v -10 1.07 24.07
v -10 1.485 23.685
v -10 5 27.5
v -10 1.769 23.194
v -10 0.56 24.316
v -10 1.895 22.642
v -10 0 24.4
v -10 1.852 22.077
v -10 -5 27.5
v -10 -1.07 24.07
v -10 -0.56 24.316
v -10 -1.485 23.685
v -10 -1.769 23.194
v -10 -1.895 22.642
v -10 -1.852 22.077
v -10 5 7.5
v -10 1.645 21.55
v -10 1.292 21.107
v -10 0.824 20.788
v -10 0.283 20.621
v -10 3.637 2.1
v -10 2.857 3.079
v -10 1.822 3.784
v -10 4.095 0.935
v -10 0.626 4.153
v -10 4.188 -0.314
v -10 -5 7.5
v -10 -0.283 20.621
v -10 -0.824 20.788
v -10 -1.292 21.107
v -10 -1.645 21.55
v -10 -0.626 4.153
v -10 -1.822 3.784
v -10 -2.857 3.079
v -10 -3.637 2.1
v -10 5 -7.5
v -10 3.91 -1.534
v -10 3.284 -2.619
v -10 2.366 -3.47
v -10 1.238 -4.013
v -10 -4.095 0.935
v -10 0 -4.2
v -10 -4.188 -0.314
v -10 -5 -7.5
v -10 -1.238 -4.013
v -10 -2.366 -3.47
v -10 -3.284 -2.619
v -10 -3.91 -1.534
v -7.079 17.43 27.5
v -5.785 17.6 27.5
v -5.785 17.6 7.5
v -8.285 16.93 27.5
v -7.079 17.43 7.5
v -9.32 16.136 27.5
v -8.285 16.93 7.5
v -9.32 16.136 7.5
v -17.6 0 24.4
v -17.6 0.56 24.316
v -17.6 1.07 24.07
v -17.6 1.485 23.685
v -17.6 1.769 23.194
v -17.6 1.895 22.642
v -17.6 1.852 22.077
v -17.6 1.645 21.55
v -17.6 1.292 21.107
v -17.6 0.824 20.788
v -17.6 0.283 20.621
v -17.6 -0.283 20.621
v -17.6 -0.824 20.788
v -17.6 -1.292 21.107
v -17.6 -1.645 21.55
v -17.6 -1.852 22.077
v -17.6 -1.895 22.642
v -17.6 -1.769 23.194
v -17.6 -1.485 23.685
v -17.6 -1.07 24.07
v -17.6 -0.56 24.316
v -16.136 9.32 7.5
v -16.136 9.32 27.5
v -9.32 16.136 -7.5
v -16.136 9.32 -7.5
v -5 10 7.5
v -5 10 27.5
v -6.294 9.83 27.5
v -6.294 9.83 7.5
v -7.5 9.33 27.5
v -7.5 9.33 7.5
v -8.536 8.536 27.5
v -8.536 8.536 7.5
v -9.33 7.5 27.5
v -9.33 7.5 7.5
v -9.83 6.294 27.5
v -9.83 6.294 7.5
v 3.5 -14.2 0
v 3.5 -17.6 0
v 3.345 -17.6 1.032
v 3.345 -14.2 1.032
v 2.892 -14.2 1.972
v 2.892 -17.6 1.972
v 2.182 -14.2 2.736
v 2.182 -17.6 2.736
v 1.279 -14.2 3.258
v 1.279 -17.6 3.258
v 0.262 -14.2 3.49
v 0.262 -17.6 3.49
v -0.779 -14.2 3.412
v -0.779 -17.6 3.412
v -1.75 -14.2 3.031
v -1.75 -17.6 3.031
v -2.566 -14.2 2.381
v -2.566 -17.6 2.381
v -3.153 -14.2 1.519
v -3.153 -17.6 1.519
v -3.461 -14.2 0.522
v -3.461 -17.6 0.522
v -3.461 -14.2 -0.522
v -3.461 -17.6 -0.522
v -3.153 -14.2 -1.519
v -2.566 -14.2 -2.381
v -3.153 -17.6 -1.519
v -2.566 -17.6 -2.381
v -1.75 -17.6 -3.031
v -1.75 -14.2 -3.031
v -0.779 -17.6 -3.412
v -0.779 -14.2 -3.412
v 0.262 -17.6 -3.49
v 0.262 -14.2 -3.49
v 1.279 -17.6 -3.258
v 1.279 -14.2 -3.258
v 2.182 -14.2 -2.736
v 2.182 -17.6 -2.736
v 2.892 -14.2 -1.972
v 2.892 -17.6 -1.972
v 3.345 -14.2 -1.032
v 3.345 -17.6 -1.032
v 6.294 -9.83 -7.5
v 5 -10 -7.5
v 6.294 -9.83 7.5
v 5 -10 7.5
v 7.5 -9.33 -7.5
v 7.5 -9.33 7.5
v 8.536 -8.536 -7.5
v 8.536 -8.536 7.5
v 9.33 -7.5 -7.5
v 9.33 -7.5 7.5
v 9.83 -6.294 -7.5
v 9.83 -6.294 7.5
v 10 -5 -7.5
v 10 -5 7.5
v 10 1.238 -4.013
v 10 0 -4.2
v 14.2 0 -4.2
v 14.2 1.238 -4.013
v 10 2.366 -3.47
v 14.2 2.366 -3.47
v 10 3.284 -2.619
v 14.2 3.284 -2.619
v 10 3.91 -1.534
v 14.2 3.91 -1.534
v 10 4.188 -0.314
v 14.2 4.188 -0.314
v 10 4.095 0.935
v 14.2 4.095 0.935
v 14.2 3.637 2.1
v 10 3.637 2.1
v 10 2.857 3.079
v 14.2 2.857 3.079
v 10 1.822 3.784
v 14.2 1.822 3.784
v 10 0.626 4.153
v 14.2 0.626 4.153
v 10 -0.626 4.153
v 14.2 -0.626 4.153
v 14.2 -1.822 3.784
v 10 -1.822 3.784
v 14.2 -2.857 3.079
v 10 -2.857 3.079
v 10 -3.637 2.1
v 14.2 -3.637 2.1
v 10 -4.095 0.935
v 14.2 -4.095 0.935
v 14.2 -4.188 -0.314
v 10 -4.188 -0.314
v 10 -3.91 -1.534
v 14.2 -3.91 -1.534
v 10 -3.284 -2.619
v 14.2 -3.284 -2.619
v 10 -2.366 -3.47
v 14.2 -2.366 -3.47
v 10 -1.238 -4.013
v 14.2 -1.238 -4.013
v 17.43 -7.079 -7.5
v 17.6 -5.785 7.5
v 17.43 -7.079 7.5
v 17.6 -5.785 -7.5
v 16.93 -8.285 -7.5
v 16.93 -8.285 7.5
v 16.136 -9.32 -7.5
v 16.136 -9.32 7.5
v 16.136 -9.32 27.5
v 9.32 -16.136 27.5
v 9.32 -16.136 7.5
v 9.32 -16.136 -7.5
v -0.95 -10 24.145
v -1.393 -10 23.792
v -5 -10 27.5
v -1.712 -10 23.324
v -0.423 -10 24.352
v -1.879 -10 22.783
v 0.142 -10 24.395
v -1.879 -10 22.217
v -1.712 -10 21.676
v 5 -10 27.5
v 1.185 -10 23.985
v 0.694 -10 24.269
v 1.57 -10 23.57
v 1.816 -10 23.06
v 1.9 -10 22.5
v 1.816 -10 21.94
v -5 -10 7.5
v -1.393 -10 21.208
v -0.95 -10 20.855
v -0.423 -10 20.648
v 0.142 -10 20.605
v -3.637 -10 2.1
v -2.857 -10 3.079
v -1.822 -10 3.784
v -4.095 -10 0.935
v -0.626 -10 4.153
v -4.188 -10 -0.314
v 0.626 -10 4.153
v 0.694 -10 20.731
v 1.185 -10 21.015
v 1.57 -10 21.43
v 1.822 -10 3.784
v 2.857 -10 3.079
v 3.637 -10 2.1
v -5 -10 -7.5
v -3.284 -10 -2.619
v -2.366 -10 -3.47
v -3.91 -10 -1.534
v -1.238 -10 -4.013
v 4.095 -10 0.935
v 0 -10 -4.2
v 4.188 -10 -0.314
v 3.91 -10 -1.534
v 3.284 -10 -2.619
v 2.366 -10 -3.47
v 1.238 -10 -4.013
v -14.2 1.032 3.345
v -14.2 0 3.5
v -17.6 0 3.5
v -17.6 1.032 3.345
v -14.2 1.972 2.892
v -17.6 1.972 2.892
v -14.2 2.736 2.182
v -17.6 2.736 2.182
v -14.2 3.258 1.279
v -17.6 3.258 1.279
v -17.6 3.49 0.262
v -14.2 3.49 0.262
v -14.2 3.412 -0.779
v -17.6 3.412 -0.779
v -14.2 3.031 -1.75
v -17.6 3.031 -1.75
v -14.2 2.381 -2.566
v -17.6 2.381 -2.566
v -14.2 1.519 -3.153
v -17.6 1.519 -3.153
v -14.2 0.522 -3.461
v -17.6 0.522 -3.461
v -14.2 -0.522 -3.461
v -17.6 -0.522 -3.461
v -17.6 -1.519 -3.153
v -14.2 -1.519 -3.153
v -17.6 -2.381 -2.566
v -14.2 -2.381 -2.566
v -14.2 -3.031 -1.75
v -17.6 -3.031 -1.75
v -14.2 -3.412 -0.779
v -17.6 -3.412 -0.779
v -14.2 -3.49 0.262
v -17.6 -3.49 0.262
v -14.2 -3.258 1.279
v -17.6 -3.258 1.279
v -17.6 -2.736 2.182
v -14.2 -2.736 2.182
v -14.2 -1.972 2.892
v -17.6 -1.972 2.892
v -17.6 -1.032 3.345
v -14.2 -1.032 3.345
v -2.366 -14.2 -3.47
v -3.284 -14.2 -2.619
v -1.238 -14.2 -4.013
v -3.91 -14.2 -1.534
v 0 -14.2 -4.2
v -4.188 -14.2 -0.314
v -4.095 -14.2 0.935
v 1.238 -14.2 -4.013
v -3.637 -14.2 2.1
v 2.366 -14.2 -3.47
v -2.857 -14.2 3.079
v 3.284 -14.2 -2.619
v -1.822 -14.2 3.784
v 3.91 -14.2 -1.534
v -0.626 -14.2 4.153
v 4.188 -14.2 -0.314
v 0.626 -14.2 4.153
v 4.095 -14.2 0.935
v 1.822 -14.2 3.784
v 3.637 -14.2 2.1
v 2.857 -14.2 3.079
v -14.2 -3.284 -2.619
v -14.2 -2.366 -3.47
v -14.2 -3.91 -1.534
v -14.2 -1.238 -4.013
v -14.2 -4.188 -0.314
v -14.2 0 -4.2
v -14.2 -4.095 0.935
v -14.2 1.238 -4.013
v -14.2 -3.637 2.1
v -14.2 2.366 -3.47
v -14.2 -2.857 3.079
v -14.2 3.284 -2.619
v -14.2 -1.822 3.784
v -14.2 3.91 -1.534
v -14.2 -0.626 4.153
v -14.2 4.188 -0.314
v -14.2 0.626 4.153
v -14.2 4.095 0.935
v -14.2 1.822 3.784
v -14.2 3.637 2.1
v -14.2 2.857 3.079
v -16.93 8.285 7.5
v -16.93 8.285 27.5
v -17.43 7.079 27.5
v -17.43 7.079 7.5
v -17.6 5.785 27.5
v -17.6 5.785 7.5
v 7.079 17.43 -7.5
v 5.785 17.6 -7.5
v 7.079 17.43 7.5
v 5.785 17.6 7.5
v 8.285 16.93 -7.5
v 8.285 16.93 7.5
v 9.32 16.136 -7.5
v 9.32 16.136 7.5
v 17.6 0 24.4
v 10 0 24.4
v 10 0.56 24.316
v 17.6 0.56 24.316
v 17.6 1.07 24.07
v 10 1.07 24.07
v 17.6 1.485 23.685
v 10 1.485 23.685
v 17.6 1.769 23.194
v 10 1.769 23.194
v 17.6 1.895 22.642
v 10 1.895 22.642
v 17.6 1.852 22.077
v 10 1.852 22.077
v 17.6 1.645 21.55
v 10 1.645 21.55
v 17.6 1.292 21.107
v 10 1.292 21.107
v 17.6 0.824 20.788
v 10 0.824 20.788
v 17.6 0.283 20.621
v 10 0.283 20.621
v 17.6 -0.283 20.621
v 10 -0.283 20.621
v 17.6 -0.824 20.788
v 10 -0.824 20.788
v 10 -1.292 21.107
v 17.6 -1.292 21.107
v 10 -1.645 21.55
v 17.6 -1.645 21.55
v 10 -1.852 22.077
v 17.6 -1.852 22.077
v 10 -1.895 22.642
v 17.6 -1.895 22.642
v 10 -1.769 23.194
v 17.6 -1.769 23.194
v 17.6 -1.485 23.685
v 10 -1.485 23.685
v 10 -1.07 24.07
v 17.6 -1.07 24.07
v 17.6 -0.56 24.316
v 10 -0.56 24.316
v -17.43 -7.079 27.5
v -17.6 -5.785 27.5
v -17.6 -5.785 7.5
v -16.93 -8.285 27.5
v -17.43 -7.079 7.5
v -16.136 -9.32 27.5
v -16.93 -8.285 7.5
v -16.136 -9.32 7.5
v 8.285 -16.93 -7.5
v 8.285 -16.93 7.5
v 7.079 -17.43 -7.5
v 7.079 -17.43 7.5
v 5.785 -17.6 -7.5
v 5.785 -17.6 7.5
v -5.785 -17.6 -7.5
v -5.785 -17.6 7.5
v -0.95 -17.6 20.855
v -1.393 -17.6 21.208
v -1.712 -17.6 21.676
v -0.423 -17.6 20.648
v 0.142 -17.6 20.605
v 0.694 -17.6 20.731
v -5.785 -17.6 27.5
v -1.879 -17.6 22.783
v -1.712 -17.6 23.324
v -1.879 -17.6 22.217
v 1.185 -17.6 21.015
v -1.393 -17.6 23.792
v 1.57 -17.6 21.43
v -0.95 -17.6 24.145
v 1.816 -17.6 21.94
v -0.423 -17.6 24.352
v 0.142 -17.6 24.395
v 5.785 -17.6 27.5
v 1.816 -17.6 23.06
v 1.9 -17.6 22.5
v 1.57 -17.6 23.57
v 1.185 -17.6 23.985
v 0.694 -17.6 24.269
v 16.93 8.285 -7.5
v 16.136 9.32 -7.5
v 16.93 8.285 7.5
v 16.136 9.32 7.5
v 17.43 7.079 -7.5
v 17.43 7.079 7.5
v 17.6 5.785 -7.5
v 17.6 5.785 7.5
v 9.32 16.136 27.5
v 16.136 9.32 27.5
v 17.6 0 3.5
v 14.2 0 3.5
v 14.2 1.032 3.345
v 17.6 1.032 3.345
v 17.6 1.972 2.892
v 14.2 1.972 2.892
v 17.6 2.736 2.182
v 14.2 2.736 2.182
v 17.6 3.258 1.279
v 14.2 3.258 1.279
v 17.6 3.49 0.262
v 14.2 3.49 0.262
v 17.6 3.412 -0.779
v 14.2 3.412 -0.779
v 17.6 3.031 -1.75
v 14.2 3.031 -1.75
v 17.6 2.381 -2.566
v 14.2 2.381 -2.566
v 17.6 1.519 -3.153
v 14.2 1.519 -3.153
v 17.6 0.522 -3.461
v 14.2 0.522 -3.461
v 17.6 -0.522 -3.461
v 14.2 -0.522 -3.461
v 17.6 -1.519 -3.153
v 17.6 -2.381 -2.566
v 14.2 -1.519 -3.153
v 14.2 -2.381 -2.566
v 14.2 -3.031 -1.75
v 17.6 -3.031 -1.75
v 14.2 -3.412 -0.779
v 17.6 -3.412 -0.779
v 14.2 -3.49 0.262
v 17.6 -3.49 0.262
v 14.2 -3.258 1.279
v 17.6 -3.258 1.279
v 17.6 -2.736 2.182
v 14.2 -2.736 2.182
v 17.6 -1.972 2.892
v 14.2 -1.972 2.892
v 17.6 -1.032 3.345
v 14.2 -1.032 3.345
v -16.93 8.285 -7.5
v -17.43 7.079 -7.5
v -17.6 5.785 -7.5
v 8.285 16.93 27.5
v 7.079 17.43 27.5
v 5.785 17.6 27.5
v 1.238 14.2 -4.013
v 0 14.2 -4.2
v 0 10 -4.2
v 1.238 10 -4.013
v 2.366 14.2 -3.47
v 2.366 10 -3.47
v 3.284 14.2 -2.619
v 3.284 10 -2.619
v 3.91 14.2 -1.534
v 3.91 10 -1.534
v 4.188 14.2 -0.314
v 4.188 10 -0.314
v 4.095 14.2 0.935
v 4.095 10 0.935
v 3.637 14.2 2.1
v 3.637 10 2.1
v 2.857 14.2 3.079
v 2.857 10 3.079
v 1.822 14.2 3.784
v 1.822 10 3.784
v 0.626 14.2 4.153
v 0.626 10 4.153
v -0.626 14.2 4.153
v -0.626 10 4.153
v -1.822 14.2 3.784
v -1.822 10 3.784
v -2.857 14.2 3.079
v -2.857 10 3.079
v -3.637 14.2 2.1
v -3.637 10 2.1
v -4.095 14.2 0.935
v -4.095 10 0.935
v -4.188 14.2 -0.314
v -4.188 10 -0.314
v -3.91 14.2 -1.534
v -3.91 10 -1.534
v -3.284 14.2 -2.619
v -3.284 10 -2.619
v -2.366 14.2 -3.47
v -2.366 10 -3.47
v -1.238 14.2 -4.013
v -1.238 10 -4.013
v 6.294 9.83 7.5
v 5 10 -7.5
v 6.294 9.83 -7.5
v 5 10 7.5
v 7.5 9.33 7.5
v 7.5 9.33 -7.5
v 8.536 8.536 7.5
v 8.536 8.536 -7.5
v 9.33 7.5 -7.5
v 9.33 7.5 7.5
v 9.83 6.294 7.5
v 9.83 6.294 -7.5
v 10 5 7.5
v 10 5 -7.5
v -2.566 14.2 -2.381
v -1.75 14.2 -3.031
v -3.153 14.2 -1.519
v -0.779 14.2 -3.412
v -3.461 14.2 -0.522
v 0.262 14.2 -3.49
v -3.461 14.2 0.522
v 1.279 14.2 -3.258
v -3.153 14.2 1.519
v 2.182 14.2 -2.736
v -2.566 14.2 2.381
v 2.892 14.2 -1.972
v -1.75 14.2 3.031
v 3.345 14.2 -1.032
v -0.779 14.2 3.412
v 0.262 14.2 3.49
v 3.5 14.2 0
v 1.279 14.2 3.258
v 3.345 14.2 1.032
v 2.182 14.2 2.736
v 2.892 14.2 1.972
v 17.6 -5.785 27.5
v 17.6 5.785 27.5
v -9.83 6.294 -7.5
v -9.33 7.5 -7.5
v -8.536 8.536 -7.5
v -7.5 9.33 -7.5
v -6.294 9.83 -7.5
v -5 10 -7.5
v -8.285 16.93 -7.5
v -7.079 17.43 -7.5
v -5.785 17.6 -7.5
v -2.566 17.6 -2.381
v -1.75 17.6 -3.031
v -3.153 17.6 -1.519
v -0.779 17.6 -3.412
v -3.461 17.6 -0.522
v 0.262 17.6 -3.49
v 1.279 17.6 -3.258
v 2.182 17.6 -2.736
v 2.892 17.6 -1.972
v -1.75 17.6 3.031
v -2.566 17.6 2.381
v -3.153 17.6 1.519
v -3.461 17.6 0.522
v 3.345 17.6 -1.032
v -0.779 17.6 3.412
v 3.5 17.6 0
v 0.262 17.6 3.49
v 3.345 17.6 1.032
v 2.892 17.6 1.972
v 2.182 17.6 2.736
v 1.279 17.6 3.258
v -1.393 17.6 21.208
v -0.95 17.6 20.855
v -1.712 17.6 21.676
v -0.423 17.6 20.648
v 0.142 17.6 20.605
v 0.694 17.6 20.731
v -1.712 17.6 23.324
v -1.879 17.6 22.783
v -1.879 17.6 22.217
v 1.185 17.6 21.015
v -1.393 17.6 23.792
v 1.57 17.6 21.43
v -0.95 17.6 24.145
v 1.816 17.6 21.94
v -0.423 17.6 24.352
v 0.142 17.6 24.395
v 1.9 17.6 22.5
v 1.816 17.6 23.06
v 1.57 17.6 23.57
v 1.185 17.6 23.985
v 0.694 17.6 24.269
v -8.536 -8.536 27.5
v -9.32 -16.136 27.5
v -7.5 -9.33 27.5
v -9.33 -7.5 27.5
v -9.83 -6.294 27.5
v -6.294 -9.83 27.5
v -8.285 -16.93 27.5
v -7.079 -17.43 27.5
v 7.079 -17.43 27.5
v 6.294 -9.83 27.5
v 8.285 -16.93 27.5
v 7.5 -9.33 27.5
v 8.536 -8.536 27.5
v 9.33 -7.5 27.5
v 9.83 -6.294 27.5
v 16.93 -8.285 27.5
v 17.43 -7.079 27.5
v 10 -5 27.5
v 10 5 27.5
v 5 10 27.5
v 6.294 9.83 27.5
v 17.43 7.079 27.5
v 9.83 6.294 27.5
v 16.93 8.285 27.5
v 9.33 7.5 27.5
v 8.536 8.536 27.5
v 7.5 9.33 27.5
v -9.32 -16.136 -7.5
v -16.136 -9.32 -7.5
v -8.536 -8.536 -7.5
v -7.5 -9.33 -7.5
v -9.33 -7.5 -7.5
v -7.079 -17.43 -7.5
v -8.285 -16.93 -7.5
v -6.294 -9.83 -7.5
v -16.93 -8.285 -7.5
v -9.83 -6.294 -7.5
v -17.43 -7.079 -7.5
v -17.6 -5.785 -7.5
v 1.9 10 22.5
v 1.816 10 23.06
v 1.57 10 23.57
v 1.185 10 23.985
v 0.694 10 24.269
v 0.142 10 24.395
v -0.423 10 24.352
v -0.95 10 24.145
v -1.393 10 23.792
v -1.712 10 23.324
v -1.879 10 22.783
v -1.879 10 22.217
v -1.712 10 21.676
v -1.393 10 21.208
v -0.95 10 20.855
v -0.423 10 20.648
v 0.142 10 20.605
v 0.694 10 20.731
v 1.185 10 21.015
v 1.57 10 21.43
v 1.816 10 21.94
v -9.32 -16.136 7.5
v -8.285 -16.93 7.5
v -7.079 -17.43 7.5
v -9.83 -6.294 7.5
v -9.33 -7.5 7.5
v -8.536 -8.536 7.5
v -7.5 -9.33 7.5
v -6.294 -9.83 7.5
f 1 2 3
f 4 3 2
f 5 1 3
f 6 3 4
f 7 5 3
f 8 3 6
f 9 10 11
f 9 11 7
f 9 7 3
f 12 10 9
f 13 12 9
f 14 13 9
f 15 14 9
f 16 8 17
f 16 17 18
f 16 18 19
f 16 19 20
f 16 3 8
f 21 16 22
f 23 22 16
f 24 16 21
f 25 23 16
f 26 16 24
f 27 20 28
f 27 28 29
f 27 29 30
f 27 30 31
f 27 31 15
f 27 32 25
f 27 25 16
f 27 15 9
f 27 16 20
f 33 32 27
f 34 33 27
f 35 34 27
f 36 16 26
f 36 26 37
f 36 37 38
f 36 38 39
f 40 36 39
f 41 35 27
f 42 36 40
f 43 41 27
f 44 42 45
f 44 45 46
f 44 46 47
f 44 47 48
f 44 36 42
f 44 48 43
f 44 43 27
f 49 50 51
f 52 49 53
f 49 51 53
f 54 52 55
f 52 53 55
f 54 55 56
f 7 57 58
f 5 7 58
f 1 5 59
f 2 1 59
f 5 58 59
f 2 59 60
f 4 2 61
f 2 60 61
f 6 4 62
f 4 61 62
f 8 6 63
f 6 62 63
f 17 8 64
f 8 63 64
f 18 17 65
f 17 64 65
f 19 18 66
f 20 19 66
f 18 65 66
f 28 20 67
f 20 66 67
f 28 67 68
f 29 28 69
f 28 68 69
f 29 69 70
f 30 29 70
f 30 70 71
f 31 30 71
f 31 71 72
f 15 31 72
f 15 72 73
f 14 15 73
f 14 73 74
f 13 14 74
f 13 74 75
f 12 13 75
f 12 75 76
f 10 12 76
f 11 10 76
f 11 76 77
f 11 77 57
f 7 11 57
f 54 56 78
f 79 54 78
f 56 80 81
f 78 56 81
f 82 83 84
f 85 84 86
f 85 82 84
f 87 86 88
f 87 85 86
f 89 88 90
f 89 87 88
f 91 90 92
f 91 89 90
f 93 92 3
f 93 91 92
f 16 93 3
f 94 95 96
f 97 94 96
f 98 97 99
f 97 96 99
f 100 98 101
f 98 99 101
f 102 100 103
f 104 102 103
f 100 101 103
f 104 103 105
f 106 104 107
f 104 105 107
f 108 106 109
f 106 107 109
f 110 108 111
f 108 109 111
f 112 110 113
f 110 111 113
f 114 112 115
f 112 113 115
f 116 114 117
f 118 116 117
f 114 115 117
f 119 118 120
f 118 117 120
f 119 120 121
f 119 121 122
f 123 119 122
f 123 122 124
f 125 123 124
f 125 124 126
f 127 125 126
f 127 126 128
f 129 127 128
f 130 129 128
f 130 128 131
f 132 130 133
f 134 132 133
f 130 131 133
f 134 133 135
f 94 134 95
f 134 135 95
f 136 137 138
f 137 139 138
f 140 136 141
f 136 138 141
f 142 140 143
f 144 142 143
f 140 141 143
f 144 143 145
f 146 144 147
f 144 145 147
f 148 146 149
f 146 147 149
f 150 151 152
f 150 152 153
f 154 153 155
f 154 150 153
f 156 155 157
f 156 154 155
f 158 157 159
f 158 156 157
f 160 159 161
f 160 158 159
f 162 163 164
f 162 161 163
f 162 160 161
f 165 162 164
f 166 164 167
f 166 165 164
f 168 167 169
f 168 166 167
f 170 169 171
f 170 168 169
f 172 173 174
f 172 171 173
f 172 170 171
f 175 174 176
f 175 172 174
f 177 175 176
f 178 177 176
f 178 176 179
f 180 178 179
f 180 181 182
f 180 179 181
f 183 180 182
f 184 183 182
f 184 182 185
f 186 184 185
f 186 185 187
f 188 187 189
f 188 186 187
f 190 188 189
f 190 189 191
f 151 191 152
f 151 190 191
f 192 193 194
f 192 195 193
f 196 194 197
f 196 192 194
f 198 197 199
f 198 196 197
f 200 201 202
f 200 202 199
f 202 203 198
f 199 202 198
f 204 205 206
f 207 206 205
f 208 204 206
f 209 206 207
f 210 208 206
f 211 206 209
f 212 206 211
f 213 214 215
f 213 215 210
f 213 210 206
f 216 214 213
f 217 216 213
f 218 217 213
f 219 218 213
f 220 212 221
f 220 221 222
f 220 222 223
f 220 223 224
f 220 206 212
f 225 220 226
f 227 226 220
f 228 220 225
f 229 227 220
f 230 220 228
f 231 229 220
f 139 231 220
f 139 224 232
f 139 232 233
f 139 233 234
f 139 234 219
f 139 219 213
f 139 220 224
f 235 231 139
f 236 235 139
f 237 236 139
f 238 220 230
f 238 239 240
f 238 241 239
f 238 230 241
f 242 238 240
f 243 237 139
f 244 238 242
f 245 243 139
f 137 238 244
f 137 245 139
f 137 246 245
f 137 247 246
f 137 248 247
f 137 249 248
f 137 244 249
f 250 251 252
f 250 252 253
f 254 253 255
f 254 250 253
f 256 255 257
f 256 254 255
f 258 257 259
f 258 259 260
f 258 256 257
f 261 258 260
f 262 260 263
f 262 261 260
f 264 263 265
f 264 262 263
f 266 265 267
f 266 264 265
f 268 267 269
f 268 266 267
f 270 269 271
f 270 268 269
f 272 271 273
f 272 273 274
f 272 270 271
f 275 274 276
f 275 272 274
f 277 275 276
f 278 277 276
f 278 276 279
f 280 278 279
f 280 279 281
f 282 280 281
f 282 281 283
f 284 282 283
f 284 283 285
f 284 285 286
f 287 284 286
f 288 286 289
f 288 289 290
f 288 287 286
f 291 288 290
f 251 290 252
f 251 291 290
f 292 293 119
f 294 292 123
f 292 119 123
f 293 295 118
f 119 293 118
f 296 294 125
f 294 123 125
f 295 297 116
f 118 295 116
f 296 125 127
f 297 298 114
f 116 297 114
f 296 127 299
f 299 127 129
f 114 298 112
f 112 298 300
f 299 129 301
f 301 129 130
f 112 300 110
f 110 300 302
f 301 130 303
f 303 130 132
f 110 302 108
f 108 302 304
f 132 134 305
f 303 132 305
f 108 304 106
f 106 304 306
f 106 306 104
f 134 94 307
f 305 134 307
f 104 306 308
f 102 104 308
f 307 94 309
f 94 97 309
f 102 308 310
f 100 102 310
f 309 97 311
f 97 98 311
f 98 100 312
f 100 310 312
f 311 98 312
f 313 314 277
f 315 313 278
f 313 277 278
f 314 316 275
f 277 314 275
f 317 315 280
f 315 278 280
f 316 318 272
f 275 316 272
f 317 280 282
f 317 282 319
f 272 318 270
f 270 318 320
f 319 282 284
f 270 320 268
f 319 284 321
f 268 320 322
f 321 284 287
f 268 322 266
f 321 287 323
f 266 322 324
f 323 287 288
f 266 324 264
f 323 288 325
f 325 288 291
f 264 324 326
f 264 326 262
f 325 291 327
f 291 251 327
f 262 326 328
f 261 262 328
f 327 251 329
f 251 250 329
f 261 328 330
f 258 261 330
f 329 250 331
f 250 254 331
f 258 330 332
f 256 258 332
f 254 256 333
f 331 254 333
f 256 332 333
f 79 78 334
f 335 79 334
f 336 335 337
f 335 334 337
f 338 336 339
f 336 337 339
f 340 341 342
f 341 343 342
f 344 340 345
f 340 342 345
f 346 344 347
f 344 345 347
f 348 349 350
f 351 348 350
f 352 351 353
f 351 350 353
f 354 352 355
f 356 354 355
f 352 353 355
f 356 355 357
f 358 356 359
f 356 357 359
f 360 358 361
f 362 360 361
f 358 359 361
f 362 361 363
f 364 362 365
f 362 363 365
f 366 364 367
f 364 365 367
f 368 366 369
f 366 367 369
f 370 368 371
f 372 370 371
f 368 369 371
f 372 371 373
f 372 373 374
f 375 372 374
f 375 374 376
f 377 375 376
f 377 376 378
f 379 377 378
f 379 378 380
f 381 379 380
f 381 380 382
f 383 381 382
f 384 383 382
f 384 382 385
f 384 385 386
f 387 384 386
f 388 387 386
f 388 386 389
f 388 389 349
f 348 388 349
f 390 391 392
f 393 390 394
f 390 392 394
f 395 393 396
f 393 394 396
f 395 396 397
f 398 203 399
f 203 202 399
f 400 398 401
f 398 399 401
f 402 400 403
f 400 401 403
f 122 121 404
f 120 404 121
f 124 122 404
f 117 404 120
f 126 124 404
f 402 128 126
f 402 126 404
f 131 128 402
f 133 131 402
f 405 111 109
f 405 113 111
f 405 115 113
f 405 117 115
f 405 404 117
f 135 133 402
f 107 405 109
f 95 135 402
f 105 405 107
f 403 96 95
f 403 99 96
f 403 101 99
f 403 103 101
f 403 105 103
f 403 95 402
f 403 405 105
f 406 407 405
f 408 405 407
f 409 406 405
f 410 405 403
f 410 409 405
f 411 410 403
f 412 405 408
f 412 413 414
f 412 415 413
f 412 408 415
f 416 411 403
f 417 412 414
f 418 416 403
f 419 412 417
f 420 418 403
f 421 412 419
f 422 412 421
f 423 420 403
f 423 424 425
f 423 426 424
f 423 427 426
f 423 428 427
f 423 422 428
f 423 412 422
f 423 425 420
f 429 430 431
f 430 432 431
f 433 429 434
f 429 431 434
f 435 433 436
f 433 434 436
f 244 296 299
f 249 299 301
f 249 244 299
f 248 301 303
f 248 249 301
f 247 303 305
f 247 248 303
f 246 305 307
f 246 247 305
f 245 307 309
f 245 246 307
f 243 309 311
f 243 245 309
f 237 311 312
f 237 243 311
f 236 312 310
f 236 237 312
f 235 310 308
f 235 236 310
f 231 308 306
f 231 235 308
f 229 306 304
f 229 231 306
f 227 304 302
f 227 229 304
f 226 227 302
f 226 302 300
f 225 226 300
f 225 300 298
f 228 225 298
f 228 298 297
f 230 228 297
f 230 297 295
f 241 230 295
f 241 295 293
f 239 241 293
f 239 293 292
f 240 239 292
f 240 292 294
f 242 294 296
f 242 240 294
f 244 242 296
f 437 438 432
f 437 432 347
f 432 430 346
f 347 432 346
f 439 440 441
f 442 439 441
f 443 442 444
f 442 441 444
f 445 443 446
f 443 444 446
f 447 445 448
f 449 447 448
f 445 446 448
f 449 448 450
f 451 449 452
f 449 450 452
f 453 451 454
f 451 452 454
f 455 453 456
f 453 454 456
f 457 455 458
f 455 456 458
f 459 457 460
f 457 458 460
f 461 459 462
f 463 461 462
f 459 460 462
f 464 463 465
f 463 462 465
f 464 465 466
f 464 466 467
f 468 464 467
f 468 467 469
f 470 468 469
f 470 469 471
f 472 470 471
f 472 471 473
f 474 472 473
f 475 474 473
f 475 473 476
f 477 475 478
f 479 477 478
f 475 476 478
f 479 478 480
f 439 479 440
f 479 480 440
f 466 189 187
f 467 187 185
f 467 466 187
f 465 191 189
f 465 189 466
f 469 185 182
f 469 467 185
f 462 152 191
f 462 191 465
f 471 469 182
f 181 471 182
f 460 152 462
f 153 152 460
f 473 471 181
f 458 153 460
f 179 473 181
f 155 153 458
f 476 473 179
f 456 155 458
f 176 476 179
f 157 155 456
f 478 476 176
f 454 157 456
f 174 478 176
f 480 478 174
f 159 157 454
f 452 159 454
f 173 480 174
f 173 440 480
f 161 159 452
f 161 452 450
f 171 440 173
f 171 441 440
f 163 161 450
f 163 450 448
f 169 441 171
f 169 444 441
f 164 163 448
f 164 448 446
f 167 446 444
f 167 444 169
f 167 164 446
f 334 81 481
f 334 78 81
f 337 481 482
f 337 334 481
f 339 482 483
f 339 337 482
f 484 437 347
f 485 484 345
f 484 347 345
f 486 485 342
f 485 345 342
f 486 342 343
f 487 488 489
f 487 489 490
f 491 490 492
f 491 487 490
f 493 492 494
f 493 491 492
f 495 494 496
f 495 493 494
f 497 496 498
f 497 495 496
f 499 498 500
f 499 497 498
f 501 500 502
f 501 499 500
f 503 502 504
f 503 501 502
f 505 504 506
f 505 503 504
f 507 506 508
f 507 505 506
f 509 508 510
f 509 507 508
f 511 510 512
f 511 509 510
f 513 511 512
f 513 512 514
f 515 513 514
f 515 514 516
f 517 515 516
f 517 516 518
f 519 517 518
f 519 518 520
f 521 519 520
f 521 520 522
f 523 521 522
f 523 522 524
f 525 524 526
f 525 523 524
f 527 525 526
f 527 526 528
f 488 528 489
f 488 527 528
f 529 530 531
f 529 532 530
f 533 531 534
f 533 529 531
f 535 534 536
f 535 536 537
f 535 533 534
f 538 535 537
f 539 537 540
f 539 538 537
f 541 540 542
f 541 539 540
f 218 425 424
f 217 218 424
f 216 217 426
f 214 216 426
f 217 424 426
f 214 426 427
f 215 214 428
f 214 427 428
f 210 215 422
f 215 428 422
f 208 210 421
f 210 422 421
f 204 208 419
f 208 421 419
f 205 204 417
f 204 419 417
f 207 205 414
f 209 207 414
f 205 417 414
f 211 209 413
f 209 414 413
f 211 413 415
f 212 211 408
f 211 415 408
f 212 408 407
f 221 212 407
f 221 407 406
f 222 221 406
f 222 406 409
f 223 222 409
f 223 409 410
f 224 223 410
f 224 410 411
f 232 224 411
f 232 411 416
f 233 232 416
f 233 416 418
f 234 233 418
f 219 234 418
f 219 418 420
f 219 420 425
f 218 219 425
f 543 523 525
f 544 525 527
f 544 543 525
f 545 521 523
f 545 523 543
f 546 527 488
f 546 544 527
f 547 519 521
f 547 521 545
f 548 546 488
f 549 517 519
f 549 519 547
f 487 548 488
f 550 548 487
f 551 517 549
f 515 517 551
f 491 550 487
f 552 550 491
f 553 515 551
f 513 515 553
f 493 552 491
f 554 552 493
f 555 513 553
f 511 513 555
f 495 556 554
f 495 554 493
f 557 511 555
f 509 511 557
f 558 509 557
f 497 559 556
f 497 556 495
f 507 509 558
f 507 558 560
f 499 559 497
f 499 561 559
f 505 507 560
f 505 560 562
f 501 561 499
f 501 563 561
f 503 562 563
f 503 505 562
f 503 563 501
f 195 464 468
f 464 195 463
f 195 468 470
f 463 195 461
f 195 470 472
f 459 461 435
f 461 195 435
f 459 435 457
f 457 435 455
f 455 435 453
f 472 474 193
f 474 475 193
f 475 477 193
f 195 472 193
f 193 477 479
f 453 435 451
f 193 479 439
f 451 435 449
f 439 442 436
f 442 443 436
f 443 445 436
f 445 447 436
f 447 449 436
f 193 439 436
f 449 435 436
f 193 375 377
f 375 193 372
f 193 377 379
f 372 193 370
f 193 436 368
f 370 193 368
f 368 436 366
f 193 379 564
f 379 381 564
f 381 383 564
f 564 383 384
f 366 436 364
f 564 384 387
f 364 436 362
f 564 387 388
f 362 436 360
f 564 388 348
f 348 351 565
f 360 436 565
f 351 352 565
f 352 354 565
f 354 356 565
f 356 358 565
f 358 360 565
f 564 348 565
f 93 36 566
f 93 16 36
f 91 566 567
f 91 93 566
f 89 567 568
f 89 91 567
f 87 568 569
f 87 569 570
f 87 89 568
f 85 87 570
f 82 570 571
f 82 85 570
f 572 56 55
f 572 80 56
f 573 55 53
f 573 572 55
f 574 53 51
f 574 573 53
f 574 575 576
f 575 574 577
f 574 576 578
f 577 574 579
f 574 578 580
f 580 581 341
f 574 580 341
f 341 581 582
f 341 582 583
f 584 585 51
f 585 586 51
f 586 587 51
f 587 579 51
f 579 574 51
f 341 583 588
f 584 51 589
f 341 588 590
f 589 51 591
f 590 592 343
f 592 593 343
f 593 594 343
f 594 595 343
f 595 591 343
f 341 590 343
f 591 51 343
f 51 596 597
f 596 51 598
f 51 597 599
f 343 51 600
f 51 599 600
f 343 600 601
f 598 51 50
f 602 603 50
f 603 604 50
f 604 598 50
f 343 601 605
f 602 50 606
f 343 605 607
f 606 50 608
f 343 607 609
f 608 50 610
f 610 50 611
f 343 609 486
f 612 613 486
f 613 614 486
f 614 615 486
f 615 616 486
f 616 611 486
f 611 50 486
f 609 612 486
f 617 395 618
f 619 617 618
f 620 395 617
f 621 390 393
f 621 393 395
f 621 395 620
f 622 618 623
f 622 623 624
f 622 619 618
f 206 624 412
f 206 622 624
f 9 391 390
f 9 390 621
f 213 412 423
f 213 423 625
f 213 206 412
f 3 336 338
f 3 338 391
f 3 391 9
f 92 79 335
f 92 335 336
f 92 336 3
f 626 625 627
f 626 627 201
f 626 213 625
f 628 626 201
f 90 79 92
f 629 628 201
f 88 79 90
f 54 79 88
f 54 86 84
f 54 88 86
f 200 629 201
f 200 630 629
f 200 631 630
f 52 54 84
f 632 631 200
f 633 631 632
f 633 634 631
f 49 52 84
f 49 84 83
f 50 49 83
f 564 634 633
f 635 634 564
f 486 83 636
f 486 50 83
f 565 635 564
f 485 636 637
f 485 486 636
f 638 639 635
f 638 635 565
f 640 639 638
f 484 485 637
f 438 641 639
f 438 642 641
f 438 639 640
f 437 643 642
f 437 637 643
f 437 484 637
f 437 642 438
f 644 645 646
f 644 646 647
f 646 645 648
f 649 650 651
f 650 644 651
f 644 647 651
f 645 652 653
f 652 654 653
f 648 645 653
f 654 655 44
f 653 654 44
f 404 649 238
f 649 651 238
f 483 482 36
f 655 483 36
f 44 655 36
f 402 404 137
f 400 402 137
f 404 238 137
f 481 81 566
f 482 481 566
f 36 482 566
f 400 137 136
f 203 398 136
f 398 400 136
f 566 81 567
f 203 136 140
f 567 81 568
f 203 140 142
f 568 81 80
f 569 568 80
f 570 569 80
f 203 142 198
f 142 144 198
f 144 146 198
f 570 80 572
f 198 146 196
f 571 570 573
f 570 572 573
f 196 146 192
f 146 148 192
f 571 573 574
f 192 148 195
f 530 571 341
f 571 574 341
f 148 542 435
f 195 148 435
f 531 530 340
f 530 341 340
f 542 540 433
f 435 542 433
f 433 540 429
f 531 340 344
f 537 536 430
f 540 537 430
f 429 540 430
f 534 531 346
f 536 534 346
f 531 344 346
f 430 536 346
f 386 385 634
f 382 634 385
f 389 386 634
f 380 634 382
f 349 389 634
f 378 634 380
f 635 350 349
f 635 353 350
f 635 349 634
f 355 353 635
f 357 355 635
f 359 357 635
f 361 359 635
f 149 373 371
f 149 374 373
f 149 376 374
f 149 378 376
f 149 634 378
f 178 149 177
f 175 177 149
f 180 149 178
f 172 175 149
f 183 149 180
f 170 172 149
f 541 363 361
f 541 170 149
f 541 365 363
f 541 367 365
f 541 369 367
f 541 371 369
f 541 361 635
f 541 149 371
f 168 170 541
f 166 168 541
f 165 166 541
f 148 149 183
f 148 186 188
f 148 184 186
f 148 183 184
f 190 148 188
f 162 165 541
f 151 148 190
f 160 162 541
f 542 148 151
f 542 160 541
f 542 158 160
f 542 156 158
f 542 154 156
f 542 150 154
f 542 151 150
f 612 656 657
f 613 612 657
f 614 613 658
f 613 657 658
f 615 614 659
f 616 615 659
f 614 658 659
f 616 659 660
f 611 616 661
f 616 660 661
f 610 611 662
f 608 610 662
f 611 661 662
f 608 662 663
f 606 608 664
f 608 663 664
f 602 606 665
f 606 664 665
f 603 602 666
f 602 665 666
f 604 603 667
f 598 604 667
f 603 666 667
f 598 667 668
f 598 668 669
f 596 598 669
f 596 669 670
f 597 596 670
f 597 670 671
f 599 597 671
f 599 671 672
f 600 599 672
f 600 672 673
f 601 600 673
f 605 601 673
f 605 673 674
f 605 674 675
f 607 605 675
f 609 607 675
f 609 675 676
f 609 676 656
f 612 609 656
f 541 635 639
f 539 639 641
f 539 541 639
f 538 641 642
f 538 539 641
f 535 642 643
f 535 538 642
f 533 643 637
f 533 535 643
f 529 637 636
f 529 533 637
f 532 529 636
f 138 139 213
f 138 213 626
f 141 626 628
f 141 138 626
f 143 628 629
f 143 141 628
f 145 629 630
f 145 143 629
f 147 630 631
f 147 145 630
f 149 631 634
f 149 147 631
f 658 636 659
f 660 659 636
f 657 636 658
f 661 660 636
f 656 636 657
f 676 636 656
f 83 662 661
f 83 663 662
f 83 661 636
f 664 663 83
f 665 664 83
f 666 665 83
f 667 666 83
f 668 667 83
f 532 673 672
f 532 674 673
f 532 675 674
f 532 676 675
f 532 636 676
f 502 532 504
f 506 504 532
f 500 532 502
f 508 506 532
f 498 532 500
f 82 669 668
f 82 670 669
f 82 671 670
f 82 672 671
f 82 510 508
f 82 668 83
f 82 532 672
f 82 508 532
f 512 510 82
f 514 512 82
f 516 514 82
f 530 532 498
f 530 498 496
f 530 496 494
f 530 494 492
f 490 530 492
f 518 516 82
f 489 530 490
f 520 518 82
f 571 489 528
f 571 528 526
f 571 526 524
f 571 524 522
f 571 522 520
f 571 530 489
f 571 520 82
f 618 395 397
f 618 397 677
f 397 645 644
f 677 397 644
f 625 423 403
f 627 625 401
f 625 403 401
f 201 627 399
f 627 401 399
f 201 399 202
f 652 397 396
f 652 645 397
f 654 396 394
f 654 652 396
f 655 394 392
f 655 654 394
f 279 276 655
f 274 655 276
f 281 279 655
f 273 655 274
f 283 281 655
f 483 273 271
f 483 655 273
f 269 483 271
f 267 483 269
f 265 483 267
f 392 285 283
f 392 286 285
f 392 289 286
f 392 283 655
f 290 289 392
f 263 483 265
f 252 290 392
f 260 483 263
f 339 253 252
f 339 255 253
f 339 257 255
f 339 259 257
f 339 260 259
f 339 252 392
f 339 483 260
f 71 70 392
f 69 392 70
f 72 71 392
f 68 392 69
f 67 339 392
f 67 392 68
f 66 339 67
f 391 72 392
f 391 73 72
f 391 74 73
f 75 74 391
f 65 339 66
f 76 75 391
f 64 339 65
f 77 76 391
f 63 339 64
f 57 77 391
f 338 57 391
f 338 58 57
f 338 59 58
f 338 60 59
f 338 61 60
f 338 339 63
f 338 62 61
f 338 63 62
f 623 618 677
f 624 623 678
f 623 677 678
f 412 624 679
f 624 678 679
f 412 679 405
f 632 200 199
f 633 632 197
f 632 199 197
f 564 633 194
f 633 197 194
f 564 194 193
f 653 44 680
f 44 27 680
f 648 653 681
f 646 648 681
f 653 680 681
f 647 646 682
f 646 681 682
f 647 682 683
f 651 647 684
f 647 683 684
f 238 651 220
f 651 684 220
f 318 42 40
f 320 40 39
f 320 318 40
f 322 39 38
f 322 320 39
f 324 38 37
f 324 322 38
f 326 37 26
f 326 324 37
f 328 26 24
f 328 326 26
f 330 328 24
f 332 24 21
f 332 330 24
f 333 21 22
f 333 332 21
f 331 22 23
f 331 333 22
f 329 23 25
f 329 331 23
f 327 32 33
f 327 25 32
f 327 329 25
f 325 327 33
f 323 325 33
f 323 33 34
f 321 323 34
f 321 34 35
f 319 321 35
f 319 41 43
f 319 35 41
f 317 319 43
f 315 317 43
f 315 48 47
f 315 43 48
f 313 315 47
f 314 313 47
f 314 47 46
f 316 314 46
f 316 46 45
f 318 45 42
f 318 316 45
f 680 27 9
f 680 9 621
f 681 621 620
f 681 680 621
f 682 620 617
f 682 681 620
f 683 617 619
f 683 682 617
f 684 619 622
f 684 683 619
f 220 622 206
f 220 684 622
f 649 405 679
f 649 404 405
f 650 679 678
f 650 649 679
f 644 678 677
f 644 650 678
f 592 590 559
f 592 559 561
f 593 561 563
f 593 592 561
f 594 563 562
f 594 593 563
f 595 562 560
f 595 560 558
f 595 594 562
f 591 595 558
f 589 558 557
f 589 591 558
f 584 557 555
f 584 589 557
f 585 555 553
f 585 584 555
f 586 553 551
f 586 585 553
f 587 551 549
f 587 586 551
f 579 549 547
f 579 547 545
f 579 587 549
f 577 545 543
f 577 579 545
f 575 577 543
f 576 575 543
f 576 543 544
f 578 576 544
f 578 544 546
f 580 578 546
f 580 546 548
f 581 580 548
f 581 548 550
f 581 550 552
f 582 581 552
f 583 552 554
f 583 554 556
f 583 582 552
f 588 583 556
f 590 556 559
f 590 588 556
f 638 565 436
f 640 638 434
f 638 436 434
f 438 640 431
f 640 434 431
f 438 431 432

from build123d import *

# Parameters (mm, degrees)
EXTRUDE_1_DEPTH          = 7.5
CUT_EXTRUDE_1_DEPTH      = 30.546573405
CUT_EXTRUDE_1_DEPTH_BACK = 30.546573405
SKETCH_2_W               = 20
SKETCH_2_H               = 20
SKETCH_11_W              = 29.504788154
SKETCH_11_H              = 47.493911142
CUT_EXTRUDE_7_DEPTH      = 0.4
SKETCH_12_W              = 20.237973212
SKETCH_12_H              = 25.719397838
CUT_EXTRUDE_8_DEPTH      = 0.4
FILLET_1_R               = 5
FILLET_2_R               = 5
CUT_EXTRUDE_2_DEPTH      = 41.063075269
CUT_EXTRUDE_2_DEPTH_BACK = 41.063075269
SKETCH_3_R               = 4.2
CUT_EXTRUDE_3_DEPTH      = 41.063075269
CUT_EXTRUDE_3_DEPTH_BACK = 41.063075269
SKETCH_4_R               = 4.2
EXTRUDE_2_DEPTH          = 20
SKETCH_6_R               = 4.2
SKETCH_6_R_2             = 3.5
EXTRUDE_3_DEPTH          = 3.4
EXTRUDE_START            = -3.4
SKETCH_13_R              = 4.2
SKETCH_13_R_2            = 3.5
EXTRUDE_4_DEPTH          = 3.4
SKETCH_14_R              = 1.9
CUT_EXTRUDE_9_DEPTH      = 49.010936254
SKETCH_15_R              = 1.9
CUT_EXTRUDE_10_DEPTH     = 49.010936254


with BuildPart() as part:
    # ｽｹｯﾁ1 → ﾎﾞｽ - 押し出し1 (new, symmetric)
    with BuildSketch(Plane.XY):
        Polygon((7.455844123, -18), (18, -7.455844123), (18, 7.455844123), (7.455844123, 18), (-7.455844123, 18), (-18, 7.455844123), (-18, -7.455844123), (-7.455844123, -18), align=None)
    extrude(amount=EXTRUDE_1_DEPTH, both=True)

    # ｽｹｯﾁ2 → ｶｯﾄ - 押し出し1 (cut, two sides: drawn at the far end of the back side and taken through both)
    with BuildSketch(Plane.XY.offset(7.5).offset(-CUT_EXTRUDE_1_DEPTH_BACK)):
        Rectangle(SKETCH_2_W, SKETCH_2_H)
    extrude(amount=CUT_EXTRUDE_1_DEPTH + CUT_EXTRUDE_1_DEPTH_BACK, mode=Mode.SUBTRACT)

    # ｽｹｯﾁ11 → ｶｯﾄ - 押し出し7 (cut)
    with BuildSketch(Plane(origin=(0, 18, 0), x_dir=(1, 0, 0), z_dir=(0, 1, 0))):
        Rectangle(SKETCH_11_W, SKETCH_11_H)
    cut_extrude_7 = extrude(amount=-CUT_EXTRUDE_7_DEPTH, mode=Mode.SUBTRACT)

    # ﾐﾗｰ1: ｶｯﾄ - 押し出し7 across plane
    add(cut_extrude_7.mirror(Plane.ZX), mode=Mode.SUBTRACT)

    # ｽｹｯﾁ12 → ｶｯﾄ - 押し出し8 (cut)
    with BuildSketch(Plane.ZY.offset(18)):
        Rectangle(SKETCH_12_W, SKETCH_12_H)
    cut_extrude_8 = extrude(amount=-CUT_EXTRUDE_8_DEPTH, mode=Mode.SUBTRACT)

    # ﾐﾗｰ2: ｶｯﾄ - 押し出し8 across plane
    add(cut_extrude_8.mirror(Plane(origin=(0, 0, 0), x_dir=(0, 0, 1), z_dir=(1, 0, 0))), mode=Mode.SUBTRACT)

    # ﾌｨﾚｯﾄ1
    fillet_1_edges = [part.edges().sort_by_distance(p)[0] for p in [
        (-10, -10, 0),
        (-10, 10, 0),
        (10, 10, 0),
        (10, -10, 0),
    ]]
    fillet(fillet_1_edges, radius=FILLET_1_R)

    # ﾌｨﾚｯﾄ2
    fillet_2_edges = [part.edges().sort_by_distance(p)[0] for p in [
        (17.6, 7.855844123, 0),
        (17.6, -7.855844123, 0),
        (-7.855844123, 17.6, 0),
        (7.855844123, 17.6, 0),
        (7.855844123, -17.6, 0),
        (-7.855844123, -17.6, 0),
        (-17.6, -7.855844123, 0),
        (-17.6, 7.855844123, 0),
    ]]
    fillet(fillet_2_edges, radius=FILLET_2_R)

    # ｽｹｯﾁ3 → ｶｯﾄ - 押し出し2 (cut, two sides: drawn at the far end of the back side and taken through both)
    with BuildSketch(Plane.XZ.offset(17.6).offset(-CUT_EXTRUDE_2_DEPTH_BACK)):
        with Locations(Location((0, 0, 0), (0, 0, 270))):
            Circle(SKETCH_3_R)
    extrude(amount=CUT_EXTRUDE_2_DEPTH + CUT_EXTRUDE_2_DEPTH_BACK, mode=Mode.SUBTRACT)

    # ｽｹｯﾁ4 → ｶｯﾄ - 押し出し3 (cut, two sides: drawn at the far end of the back side and taken through both)
    with BuildSketch(Plane(origin=(17.6, 0, 0), x_dir=(0, 0, -1), z_dir=(1, 0, 0)).offset(-CUT_EXTRUDE_3_DEPTH_BACK)):
        Circle(SKETCH_4_R)
    extrude(amount=CUT_EXTRUDE_3_DEPTH + CUT_EXTRUDE_3_DEPTH_BACK, mode=Mode.SUBTRACT)

    # ｽｹｯﾁ5 → ﾎﾞｽ - 押し出し2 (add)
    with BuildSketch(Plane.XY.offset(7.5)):
        with BuildLine():
            Line((17.6, -5.784776311), (17.6, 5.784776311))
            ThreePointArc((17.6, 5.784776311), (17.219397663, 7.698193473), (16.135533906, 9.320310217))
            Line((16.135533906, 9.320310217), (9.320310217, 16.135533906))
            ThreePointArc((9.320310217, 16.135533906), (7.698193473, 17.219397663), (5.784776311, 17.6))
            Line((5.784776311, 17.6), (-5.784776311, 17.6))
            ThreePointArc((-5.784776311, 17.6), (-7.698193473, 17.219397663), (-9.320310217, 16.135533906))
            Line((-9.320310217, 16.135533906), (-16.135533906, 9.320310217))
            ThreePointArc((-16.135533906, 9.320310217), (-17.219397663, 7.698193473), (-17.6, 5.784776311))
            Line((-17.6, 5.784776311), (-17.6, -5.784776311))
            ThreePointArc((-17.6, -5.784776311), (-17.219397663, -7.698193473), (-16.135533906, -9.320310217))
            Line((-16.135533906, -9.320310217), (-9.320310217, -16.135533906))
            ThreePointArc((-9.320310217, -16.135533906), (-7.698193473, -17.219397663), (-5.784776311, -17.6))
            Line((-5.784776311, -17.6), (5.784776311, -17.6))
            ThreePointArc((5.784776311, -17.6), (7.698193473, -17.219397663), (9.320310217, -16.135533906))
            Line((9.320310217, -16.135533906), (16.135533906, -9.320310217))
            ThreePointArc((16.135533906, -9.320310217), (17.219397663, -7.698193473), (17.6, -5.784776311))
        make_face()
        with BuildLine():
            Line((5, 10), (-5, 10))
            ThreePointArc((-5, 10), (-8.535533906, 8.535533906), (-10, 5))
            Line((-10, 5), (-10, -5))
            ThreePointArc((-10, -5), (-8.535533906, -8.535533906), (-5, -10))
            Line((-5, -10), (5, -10))
            ThreePointArc((5, -10), (8.535533906, -8.535533906), (10, -5))
            Line((10, -5), (10, 5))
            ThreePointArc((10, 5), (8.535533906, 8.535533906), (5, 10))
        make_face(mode=Mode.SUBTRACT)
    extrude(amount=EXTRUDE_2_DEPTH)

    # ｽｹｯﾁ6 → ﾎﾞｽ - 押し出し3 (add)
    with BuildSketch(Plane.XZ.offset(17.6)):
        Circle(SKETCH_6_R)
        Circle(SKETCH_6_R_2, mode=Mode.SUBTRACT)
    extrude_3 = extrude(amount=-EXTRUDE_3_DEPTH)

    # ﾐﾗｰ3: ﾎﾞｽ - 押し出し3 across plane
    add(extrude_3.mirror(Plane.ZX))

    # ｽｹｯﾁ13 → ﾎﾞｽ - 押し出し4 (add)
    with BuildSketch(Plane.ZY.offset(17.6).offset(EXTRUDE_START)):
        Circle(SKETCH_13_R)
        Circle(SKETCH_13_R_2, mode=Mode.SUBTRACT)
    extrude_4 = extrude(amount=EXTRUDE_4_DEPTH)

    # ﾐﾗｰ4: ﾎﾞｽ - 押し出し4 across plane
    add(extrude_4.mirror(Plane(origin=(0, 0, 0), x_dir=(0, 0, 1), z_dir=(1, 0, 0))))

    # ｽｹｯﾁ14 → ｶｯﾄ - 押し出し9 (cut, through all)
    with BuildSketch(Plane.ZY.offset(17.6)):
        with Locations((22.5, 0)):
            Circle(SKETCH_14_R)
    extrude(amount=-CUT_EXTRUDE_9_DEPTH, mode=Mode.SUBTRACT)

    # ｽｹｯﾁ15 → ｶｯﾄ - 押し出し10 (cut, through all)
    with BuildSketch(Plane.XZ.offset(17.6)):
        with Locations((0, 22.5)):
            Circle(SKETCH_15_R)
    extrude(amount=-CUT_EXTRUDE_10_DEPTH, mode=Mode.SUBTRACT)


solid = part.part
